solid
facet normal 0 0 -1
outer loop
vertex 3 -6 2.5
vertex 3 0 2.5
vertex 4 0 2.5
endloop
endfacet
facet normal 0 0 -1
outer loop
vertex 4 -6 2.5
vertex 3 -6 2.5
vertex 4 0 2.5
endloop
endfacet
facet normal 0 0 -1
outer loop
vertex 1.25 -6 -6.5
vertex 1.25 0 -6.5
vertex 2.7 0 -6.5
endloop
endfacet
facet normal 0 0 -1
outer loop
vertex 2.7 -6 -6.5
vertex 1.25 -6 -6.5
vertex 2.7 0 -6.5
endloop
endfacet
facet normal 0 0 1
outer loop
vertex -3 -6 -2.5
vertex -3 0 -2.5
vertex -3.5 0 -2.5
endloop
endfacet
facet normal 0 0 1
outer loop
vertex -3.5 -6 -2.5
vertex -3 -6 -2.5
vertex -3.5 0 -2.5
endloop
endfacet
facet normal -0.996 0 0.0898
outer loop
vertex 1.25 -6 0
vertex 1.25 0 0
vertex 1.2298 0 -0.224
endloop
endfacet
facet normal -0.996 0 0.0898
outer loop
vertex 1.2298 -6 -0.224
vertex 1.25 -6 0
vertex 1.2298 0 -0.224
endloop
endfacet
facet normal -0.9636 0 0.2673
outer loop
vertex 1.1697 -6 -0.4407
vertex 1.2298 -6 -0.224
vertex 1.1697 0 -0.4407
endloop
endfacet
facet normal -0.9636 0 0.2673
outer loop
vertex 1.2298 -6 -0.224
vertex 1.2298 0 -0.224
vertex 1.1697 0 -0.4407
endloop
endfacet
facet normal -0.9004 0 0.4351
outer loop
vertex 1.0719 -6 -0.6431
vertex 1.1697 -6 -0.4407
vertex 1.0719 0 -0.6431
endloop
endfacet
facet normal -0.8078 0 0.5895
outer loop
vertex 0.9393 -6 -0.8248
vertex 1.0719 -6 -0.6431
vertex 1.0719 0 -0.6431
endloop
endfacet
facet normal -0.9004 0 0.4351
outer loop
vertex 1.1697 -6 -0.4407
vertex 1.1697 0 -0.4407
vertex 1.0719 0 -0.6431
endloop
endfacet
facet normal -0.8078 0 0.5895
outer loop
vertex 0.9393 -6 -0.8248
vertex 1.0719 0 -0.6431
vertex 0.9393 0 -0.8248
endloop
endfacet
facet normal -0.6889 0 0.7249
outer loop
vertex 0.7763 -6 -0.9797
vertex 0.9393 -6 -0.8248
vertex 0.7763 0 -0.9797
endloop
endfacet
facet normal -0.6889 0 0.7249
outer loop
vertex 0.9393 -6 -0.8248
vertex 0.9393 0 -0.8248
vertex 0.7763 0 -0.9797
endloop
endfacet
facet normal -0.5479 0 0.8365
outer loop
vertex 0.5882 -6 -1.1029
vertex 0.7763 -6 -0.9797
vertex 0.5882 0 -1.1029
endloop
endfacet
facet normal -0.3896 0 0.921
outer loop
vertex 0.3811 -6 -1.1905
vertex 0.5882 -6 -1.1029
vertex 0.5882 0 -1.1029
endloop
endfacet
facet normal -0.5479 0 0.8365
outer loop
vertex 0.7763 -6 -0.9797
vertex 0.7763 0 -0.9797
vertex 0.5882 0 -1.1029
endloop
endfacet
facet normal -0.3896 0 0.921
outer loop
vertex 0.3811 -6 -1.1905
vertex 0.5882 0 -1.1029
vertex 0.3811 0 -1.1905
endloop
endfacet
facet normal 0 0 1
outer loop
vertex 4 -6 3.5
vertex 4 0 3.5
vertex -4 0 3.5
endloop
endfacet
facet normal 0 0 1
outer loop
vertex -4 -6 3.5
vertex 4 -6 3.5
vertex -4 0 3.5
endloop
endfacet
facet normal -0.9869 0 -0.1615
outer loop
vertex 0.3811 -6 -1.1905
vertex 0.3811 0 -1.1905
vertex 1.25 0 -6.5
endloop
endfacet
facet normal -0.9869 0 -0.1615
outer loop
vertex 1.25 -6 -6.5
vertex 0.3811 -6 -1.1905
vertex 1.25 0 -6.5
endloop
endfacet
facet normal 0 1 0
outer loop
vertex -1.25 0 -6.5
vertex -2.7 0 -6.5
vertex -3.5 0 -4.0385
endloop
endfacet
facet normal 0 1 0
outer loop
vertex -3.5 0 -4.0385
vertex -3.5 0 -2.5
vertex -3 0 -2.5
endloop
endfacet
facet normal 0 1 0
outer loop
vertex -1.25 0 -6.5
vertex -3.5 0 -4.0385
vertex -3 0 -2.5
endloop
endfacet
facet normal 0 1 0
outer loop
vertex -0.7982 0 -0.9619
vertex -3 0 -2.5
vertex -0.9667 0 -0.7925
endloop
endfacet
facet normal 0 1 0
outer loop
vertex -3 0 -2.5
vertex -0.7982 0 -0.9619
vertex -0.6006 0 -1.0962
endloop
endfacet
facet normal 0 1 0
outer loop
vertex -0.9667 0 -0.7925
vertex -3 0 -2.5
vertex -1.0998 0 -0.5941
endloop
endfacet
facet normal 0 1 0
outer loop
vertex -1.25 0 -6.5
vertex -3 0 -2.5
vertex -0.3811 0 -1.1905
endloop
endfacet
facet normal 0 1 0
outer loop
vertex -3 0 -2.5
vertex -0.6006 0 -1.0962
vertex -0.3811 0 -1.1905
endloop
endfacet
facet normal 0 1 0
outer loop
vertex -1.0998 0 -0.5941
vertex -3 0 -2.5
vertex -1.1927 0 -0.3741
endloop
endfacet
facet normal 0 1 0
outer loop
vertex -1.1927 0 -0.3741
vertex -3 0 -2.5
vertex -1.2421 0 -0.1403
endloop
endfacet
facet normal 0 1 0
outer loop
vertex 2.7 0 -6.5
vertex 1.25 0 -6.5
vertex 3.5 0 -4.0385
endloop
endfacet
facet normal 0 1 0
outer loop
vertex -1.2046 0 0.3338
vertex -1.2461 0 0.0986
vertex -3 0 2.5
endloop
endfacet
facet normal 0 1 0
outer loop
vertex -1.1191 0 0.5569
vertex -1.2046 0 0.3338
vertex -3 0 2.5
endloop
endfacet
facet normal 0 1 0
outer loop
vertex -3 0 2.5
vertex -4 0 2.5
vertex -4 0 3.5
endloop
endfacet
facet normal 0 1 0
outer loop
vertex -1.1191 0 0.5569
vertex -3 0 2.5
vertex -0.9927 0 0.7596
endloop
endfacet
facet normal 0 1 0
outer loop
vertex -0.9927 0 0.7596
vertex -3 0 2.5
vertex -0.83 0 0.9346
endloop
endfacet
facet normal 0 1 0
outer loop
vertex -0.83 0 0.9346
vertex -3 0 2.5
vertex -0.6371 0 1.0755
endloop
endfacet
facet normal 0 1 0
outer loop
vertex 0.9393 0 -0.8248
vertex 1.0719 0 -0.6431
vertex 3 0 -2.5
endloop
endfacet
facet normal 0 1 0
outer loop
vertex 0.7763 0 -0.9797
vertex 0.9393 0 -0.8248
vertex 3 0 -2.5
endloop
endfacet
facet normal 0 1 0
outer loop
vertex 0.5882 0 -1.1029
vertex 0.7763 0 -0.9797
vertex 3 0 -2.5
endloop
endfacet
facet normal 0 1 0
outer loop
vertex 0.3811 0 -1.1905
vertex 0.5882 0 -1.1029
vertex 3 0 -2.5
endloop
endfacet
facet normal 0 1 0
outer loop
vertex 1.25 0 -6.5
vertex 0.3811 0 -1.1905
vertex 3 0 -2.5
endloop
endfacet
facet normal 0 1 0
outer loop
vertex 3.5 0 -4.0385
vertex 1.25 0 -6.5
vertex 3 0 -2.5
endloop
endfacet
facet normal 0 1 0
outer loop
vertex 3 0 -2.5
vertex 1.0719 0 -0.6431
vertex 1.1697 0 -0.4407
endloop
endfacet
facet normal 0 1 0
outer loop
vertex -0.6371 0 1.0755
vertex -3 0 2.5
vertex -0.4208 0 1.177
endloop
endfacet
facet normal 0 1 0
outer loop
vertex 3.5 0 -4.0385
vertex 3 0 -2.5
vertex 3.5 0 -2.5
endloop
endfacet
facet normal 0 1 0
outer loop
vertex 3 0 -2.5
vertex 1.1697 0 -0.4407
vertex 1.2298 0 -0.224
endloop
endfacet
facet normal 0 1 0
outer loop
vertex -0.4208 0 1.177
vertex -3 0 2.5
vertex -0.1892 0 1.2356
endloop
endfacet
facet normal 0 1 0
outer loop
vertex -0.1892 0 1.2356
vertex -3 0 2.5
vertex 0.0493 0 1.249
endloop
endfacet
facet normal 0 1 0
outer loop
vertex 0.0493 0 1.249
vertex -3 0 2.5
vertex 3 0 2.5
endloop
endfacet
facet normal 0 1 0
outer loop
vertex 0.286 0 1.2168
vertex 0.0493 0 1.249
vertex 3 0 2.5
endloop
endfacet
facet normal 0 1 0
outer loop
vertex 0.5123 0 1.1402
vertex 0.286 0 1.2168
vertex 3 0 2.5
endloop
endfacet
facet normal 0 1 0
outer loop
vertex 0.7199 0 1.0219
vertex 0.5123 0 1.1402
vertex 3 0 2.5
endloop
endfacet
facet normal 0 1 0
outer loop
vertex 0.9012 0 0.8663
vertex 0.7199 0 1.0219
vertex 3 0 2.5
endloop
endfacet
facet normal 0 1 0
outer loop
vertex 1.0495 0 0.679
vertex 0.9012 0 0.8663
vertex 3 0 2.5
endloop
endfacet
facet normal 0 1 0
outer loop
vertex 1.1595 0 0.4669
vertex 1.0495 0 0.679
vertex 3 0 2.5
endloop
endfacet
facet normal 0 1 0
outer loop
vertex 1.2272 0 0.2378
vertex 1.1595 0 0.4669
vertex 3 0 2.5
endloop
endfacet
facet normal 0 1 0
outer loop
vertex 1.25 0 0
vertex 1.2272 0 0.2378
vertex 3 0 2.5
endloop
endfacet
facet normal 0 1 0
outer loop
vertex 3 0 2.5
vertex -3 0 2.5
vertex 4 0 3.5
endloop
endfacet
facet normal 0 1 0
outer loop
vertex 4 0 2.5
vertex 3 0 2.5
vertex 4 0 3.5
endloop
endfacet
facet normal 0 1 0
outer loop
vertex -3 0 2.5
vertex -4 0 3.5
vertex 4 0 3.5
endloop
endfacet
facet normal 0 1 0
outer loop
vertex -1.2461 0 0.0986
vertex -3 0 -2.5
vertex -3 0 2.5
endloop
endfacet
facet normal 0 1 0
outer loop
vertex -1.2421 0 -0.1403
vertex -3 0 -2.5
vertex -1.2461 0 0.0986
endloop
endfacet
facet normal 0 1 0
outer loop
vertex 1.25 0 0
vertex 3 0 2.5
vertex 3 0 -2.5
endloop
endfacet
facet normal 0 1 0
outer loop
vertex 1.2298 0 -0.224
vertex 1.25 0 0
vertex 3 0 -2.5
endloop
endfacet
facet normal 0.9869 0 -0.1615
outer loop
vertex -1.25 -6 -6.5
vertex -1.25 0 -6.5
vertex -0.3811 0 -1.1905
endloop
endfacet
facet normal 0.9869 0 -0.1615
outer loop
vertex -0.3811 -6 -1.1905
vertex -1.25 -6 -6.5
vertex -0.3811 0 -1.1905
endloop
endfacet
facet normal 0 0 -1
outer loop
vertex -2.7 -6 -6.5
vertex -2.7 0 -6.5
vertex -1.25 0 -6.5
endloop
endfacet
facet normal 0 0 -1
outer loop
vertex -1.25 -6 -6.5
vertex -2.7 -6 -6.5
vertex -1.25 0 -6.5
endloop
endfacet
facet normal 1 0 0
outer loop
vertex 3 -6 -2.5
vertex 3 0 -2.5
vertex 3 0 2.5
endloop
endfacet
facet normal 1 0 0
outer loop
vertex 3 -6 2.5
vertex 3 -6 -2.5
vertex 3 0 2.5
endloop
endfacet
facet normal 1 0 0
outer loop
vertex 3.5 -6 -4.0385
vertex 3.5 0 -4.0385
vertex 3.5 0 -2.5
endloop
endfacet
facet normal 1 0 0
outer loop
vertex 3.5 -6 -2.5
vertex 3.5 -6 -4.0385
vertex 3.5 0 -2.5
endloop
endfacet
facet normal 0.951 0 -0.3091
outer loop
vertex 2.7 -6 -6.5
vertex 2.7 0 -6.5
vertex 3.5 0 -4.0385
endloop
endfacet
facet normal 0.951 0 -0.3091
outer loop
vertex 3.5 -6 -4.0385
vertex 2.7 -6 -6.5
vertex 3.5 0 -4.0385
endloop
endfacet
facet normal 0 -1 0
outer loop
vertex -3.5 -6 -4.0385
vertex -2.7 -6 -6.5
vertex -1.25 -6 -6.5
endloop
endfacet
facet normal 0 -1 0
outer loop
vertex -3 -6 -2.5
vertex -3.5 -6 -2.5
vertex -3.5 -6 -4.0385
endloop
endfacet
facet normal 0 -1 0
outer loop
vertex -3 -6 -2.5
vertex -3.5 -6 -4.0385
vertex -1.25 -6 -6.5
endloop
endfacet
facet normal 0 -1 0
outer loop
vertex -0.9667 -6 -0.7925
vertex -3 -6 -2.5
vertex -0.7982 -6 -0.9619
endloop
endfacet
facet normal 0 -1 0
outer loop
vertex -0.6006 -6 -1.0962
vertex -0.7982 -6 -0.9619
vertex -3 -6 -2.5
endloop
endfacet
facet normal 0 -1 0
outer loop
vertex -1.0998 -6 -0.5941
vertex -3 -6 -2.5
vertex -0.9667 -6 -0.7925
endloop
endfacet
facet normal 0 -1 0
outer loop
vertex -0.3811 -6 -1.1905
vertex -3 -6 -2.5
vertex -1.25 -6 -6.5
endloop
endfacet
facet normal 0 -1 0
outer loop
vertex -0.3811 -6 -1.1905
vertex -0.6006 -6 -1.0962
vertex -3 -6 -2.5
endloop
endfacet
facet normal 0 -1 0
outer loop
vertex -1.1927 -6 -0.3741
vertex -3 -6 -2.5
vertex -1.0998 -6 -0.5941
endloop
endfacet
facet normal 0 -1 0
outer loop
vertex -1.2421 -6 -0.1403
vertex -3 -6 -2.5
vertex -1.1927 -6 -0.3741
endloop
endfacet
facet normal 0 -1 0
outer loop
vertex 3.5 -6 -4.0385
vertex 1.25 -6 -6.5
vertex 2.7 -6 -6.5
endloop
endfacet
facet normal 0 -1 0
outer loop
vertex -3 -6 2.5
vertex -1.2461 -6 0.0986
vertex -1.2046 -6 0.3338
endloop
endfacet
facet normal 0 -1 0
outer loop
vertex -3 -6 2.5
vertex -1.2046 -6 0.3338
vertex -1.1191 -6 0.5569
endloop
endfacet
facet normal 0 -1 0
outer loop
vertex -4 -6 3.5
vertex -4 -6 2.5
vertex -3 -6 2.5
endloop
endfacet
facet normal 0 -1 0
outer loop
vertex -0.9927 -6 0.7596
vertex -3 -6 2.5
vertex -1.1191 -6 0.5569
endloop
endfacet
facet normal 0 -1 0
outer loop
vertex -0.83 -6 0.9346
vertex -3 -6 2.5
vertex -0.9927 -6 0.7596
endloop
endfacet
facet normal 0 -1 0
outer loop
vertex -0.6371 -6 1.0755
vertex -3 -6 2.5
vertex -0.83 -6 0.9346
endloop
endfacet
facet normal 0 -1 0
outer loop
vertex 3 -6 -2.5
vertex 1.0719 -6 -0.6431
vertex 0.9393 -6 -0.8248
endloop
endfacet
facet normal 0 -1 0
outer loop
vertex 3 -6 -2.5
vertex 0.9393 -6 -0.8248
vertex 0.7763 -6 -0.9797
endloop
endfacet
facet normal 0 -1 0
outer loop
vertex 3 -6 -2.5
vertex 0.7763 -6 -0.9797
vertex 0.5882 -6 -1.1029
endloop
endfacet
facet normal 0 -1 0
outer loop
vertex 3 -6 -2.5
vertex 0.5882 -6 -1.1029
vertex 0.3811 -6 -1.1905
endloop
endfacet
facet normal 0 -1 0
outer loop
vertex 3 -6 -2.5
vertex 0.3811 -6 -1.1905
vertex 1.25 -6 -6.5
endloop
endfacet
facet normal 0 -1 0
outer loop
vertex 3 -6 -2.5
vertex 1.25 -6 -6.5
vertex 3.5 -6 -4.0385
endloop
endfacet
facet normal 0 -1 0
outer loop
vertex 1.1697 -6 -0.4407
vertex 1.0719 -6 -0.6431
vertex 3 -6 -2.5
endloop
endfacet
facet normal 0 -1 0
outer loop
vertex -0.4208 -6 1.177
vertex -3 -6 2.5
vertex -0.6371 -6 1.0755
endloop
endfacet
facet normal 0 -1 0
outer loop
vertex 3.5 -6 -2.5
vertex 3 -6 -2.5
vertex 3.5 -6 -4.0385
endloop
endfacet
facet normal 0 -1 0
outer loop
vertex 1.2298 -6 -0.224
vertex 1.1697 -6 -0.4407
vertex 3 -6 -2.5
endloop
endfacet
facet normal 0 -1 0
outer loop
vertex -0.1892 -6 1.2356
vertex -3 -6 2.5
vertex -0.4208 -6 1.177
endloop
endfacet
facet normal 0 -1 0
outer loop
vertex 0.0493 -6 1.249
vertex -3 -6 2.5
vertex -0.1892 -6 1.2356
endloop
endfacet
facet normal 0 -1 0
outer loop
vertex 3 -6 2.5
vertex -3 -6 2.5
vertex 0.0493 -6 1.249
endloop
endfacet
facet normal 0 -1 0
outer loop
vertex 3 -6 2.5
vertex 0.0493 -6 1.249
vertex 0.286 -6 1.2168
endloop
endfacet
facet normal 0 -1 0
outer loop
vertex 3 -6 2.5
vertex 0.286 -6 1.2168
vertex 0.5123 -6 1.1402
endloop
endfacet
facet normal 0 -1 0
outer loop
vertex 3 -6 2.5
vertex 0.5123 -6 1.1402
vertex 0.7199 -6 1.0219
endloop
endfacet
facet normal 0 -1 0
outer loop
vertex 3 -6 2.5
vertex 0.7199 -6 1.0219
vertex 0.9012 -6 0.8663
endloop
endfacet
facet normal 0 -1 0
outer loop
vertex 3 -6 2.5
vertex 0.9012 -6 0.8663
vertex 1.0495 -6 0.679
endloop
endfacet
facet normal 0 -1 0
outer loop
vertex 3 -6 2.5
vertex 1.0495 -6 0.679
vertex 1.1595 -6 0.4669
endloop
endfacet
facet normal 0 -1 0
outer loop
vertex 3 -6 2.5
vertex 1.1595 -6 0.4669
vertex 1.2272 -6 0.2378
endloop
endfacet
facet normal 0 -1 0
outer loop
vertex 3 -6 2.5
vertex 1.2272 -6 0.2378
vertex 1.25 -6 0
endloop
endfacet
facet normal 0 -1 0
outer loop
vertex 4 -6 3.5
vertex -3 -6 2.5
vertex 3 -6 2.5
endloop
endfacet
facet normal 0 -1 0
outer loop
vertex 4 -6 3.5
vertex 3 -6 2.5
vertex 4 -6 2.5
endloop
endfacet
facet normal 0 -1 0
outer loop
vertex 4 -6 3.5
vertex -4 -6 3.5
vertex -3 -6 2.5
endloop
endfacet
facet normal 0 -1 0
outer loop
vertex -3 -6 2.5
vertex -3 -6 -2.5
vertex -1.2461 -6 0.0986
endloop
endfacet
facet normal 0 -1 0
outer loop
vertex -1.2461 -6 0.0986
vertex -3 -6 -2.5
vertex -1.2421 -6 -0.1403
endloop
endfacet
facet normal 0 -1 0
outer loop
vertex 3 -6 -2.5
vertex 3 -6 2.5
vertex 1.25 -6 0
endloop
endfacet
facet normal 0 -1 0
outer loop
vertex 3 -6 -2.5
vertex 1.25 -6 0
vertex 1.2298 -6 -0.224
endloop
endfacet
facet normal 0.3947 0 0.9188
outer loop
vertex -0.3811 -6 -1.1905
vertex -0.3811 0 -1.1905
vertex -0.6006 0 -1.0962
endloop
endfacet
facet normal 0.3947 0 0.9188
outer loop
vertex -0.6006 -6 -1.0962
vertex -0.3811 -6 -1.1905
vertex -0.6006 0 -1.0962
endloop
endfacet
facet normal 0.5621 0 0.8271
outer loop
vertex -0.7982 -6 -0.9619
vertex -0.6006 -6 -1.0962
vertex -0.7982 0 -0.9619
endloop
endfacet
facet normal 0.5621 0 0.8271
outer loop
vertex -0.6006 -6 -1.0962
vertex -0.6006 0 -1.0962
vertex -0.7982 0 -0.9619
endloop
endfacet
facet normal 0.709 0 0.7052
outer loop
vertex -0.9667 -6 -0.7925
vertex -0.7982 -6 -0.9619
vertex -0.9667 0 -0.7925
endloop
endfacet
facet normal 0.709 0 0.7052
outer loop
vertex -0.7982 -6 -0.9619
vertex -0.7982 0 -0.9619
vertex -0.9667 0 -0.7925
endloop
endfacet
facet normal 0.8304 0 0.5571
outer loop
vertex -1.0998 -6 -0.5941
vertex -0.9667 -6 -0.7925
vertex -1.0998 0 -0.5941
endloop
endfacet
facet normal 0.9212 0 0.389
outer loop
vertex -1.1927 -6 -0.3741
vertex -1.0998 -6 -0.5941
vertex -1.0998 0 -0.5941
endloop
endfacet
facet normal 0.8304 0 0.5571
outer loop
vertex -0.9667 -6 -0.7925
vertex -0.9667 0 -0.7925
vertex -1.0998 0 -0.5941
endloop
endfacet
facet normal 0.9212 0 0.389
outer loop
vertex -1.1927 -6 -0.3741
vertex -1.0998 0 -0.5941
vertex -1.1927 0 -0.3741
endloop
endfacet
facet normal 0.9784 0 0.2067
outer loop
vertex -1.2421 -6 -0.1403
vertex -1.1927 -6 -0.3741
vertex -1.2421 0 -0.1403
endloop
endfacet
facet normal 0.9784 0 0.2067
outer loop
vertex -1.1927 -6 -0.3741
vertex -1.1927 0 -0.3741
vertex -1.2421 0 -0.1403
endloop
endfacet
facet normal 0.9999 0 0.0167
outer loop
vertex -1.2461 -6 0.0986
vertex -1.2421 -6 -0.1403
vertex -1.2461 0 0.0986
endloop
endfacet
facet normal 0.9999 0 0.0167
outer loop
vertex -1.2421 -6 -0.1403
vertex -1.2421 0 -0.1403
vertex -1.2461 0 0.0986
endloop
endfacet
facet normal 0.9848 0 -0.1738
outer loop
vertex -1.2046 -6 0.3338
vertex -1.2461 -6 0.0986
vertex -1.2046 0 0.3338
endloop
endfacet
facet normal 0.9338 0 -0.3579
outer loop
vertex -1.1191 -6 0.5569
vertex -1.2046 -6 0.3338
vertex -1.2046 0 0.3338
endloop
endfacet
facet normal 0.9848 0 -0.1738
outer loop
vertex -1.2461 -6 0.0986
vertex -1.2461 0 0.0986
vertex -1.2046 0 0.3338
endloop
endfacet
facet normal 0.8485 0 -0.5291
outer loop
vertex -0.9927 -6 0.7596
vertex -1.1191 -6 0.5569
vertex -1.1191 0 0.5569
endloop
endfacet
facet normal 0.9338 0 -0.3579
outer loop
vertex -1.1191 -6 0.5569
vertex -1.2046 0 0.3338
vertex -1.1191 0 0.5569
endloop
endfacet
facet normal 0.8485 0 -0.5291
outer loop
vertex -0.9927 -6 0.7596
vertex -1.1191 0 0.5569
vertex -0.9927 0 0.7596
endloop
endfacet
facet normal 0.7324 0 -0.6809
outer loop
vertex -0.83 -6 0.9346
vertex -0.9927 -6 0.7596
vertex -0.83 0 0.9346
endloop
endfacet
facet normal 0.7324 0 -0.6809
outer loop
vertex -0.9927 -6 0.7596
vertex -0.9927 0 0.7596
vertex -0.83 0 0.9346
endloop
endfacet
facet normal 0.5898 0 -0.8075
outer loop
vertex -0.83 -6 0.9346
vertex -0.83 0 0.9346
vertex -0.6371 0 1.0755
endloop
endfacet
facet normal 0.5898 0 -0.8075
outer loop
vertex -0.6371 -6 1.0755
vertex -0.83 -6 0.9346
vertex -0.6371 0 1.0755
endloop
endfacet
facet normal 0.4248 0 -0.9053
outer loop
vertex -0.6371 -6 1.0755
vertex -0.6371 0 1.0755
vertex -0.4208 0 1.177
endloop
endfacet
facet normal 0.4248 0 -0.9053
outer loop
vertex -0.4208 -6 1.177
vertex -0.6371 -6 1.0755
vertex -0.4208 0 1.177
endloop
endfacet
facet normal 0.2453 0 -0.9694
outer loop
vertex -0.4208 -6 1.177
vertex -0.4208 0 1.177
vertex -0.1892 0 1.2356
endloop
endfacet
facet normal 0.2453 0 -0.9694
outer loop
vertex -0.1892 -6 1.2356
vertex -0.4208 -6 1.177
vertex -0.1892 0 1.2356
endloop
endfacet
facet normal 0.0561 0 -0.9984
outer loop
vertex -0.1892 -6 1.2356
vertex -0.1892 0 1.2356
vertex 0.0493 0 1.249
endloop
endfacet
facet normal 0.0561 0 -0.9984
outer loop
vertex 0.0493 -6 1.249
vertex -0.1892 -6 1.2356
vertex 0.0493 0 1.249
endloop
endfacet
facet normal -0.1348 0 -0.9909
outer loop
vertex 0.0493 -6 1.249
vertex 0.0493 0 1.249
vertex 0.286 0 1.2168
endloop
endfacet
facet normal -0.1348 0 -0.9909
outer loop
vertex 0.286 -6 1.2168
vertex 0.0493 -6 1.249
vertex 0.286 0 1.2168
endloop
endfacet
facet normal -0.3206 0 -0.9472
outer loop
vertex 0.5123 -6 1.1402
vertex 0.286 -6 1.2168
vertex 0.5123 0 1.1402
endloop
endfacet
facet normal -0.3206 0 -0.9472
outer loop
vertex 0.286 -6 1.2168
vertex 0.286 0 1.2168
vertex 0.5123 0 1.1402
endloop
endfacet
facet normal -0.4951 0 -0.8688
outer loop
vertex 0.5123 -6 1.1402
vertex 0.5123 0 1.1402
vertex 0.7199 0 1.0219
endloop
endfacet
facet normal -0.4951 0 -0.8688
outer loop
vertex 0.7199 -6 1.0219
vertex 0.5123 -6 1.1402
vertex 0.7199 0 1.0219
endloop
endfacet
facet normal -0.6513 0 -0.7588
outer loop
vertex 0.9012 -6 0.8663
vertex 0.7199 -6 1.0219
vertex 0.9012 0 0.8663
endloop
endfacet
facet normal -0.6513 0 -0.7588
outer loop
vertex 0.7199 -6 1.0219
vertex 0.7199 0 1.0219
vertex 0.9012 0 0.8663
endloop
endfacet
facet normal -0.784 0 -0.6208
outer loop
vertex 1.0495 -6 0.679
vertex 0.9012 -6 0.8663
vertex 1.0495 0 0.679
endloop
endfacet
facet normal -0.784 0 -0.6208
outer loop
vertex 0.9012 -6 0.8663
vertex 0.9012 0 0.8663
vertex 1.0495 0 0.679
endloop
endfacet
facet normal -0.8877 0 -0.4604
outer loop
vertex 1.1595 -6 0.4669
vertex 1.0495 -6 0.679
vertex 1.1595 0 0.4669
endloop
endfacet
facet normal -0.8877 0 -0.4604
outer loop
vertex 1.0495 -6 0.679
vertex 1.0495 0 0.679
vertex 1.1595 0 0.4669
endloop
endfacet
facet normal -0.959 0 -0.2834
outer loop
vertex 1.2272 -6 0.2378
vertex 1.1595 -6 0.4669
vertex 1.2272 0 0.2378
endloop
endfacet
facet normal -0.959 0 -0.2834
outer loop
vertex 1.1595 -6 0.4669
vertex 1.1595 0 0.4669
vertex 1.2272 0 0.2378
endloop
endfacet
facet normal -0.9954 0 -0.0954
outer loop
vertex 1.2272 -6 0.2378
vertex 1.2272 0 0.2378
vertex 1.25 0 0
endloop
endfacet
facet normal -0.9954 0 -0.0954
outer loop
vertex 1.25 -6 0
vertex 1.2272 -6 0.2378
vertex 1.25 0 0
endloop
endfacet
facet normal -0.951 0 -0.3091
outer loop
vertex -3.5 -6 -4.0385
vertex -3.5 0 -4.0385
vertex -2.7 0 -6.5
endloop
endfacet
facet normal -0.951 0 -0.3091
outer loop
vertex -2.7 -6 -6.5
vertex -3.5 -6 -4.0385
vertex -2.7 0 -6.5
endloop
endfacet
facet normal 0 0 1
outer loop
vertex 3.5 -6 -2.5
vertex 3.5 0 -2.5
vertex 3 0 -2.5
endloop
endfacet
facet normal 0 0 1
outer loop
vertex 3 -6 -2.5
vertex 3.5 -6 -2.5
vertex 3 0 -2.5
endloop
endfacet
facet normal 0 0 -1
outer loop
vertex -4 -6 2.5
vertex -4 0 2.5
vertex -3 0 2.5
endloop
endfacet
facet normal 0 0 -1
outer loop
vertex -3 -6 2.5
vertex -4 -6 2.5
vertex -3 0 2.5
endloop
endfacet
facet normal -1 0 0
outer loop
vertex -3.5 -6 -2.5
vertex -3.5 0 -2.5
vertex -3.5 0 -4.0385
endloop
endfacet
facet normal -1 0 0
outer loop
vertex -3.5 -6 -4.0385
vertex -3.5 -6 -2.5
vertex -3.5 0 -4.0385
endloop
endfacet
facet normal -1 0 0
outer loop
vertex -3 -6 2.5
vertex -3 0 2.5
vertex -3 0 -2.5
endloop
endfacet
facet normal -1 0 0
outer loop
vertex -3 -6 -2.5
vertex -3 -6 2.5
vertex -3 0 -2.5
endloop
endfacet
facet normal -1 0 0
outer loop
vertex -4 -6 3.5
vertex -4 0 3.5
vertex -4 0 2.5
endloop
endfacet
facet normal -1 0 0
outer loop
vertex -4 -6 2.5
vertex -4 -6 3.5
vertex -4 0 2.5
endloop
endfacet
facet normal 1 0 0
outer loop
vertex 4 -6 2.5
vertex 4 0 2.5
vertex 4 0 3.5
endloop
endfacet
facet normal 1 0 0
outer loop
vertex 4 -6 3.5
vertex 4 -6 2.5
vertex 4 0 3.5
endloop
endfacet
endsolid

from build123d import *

# Parameters (mm, degrees)
F1_DEPTH = 6


with BuildPart() as f1:
    # F0 (on Front) → F1 (new body)
    with BuildSketch(Plane.XZ):
        with BuildLine():
            Line((4, 3.5), (-4, 3.5))
            Line((-4, 3.5), (-4, 2.5))
            Line((-4, 2.5), (-3, 2.5))
            Line((-3, 2.5), (-3, -2.5))
            Line((-3, -2.5), (-3.5, -2.5))
            Line((-3.5, -2.5), (-3.5, -4.038462))
            Line((-3.5, -4.038462), (-2.7, -6.5))
            Line((-2.7, -6.5), (-1.25, -6.5))
            Line((-1.25, -6.5), (-0.381107, -1.190486))
            ThreePointArc((-0.381107, -1.190486), (-0.736925, 1.009674), (1.25, 0))
            ThreePointArc((1.25, 0), (1.009674, -0.736925), (0.381107, -1.190486))
            Line((0.381107, -1.190486), (1.25, -6.5))
            Line((1.25, -6.5), (2.7, -6.5))
            Line((2.7, -6.5), (3.5, -4.038462))
            Line((3.5, -4.038462), (3.5, -2.5))
            Line((3.5, -2.5), (3, -2.5))
            Line((3, -2.5), (3, 2.5))
            Line((3, 2.5), (4, 2.5))
            Line((4, 2.5), (4, 3.5))
        make_face()
    extrude(amount=F1_DEPTH)


solid = f1.part
